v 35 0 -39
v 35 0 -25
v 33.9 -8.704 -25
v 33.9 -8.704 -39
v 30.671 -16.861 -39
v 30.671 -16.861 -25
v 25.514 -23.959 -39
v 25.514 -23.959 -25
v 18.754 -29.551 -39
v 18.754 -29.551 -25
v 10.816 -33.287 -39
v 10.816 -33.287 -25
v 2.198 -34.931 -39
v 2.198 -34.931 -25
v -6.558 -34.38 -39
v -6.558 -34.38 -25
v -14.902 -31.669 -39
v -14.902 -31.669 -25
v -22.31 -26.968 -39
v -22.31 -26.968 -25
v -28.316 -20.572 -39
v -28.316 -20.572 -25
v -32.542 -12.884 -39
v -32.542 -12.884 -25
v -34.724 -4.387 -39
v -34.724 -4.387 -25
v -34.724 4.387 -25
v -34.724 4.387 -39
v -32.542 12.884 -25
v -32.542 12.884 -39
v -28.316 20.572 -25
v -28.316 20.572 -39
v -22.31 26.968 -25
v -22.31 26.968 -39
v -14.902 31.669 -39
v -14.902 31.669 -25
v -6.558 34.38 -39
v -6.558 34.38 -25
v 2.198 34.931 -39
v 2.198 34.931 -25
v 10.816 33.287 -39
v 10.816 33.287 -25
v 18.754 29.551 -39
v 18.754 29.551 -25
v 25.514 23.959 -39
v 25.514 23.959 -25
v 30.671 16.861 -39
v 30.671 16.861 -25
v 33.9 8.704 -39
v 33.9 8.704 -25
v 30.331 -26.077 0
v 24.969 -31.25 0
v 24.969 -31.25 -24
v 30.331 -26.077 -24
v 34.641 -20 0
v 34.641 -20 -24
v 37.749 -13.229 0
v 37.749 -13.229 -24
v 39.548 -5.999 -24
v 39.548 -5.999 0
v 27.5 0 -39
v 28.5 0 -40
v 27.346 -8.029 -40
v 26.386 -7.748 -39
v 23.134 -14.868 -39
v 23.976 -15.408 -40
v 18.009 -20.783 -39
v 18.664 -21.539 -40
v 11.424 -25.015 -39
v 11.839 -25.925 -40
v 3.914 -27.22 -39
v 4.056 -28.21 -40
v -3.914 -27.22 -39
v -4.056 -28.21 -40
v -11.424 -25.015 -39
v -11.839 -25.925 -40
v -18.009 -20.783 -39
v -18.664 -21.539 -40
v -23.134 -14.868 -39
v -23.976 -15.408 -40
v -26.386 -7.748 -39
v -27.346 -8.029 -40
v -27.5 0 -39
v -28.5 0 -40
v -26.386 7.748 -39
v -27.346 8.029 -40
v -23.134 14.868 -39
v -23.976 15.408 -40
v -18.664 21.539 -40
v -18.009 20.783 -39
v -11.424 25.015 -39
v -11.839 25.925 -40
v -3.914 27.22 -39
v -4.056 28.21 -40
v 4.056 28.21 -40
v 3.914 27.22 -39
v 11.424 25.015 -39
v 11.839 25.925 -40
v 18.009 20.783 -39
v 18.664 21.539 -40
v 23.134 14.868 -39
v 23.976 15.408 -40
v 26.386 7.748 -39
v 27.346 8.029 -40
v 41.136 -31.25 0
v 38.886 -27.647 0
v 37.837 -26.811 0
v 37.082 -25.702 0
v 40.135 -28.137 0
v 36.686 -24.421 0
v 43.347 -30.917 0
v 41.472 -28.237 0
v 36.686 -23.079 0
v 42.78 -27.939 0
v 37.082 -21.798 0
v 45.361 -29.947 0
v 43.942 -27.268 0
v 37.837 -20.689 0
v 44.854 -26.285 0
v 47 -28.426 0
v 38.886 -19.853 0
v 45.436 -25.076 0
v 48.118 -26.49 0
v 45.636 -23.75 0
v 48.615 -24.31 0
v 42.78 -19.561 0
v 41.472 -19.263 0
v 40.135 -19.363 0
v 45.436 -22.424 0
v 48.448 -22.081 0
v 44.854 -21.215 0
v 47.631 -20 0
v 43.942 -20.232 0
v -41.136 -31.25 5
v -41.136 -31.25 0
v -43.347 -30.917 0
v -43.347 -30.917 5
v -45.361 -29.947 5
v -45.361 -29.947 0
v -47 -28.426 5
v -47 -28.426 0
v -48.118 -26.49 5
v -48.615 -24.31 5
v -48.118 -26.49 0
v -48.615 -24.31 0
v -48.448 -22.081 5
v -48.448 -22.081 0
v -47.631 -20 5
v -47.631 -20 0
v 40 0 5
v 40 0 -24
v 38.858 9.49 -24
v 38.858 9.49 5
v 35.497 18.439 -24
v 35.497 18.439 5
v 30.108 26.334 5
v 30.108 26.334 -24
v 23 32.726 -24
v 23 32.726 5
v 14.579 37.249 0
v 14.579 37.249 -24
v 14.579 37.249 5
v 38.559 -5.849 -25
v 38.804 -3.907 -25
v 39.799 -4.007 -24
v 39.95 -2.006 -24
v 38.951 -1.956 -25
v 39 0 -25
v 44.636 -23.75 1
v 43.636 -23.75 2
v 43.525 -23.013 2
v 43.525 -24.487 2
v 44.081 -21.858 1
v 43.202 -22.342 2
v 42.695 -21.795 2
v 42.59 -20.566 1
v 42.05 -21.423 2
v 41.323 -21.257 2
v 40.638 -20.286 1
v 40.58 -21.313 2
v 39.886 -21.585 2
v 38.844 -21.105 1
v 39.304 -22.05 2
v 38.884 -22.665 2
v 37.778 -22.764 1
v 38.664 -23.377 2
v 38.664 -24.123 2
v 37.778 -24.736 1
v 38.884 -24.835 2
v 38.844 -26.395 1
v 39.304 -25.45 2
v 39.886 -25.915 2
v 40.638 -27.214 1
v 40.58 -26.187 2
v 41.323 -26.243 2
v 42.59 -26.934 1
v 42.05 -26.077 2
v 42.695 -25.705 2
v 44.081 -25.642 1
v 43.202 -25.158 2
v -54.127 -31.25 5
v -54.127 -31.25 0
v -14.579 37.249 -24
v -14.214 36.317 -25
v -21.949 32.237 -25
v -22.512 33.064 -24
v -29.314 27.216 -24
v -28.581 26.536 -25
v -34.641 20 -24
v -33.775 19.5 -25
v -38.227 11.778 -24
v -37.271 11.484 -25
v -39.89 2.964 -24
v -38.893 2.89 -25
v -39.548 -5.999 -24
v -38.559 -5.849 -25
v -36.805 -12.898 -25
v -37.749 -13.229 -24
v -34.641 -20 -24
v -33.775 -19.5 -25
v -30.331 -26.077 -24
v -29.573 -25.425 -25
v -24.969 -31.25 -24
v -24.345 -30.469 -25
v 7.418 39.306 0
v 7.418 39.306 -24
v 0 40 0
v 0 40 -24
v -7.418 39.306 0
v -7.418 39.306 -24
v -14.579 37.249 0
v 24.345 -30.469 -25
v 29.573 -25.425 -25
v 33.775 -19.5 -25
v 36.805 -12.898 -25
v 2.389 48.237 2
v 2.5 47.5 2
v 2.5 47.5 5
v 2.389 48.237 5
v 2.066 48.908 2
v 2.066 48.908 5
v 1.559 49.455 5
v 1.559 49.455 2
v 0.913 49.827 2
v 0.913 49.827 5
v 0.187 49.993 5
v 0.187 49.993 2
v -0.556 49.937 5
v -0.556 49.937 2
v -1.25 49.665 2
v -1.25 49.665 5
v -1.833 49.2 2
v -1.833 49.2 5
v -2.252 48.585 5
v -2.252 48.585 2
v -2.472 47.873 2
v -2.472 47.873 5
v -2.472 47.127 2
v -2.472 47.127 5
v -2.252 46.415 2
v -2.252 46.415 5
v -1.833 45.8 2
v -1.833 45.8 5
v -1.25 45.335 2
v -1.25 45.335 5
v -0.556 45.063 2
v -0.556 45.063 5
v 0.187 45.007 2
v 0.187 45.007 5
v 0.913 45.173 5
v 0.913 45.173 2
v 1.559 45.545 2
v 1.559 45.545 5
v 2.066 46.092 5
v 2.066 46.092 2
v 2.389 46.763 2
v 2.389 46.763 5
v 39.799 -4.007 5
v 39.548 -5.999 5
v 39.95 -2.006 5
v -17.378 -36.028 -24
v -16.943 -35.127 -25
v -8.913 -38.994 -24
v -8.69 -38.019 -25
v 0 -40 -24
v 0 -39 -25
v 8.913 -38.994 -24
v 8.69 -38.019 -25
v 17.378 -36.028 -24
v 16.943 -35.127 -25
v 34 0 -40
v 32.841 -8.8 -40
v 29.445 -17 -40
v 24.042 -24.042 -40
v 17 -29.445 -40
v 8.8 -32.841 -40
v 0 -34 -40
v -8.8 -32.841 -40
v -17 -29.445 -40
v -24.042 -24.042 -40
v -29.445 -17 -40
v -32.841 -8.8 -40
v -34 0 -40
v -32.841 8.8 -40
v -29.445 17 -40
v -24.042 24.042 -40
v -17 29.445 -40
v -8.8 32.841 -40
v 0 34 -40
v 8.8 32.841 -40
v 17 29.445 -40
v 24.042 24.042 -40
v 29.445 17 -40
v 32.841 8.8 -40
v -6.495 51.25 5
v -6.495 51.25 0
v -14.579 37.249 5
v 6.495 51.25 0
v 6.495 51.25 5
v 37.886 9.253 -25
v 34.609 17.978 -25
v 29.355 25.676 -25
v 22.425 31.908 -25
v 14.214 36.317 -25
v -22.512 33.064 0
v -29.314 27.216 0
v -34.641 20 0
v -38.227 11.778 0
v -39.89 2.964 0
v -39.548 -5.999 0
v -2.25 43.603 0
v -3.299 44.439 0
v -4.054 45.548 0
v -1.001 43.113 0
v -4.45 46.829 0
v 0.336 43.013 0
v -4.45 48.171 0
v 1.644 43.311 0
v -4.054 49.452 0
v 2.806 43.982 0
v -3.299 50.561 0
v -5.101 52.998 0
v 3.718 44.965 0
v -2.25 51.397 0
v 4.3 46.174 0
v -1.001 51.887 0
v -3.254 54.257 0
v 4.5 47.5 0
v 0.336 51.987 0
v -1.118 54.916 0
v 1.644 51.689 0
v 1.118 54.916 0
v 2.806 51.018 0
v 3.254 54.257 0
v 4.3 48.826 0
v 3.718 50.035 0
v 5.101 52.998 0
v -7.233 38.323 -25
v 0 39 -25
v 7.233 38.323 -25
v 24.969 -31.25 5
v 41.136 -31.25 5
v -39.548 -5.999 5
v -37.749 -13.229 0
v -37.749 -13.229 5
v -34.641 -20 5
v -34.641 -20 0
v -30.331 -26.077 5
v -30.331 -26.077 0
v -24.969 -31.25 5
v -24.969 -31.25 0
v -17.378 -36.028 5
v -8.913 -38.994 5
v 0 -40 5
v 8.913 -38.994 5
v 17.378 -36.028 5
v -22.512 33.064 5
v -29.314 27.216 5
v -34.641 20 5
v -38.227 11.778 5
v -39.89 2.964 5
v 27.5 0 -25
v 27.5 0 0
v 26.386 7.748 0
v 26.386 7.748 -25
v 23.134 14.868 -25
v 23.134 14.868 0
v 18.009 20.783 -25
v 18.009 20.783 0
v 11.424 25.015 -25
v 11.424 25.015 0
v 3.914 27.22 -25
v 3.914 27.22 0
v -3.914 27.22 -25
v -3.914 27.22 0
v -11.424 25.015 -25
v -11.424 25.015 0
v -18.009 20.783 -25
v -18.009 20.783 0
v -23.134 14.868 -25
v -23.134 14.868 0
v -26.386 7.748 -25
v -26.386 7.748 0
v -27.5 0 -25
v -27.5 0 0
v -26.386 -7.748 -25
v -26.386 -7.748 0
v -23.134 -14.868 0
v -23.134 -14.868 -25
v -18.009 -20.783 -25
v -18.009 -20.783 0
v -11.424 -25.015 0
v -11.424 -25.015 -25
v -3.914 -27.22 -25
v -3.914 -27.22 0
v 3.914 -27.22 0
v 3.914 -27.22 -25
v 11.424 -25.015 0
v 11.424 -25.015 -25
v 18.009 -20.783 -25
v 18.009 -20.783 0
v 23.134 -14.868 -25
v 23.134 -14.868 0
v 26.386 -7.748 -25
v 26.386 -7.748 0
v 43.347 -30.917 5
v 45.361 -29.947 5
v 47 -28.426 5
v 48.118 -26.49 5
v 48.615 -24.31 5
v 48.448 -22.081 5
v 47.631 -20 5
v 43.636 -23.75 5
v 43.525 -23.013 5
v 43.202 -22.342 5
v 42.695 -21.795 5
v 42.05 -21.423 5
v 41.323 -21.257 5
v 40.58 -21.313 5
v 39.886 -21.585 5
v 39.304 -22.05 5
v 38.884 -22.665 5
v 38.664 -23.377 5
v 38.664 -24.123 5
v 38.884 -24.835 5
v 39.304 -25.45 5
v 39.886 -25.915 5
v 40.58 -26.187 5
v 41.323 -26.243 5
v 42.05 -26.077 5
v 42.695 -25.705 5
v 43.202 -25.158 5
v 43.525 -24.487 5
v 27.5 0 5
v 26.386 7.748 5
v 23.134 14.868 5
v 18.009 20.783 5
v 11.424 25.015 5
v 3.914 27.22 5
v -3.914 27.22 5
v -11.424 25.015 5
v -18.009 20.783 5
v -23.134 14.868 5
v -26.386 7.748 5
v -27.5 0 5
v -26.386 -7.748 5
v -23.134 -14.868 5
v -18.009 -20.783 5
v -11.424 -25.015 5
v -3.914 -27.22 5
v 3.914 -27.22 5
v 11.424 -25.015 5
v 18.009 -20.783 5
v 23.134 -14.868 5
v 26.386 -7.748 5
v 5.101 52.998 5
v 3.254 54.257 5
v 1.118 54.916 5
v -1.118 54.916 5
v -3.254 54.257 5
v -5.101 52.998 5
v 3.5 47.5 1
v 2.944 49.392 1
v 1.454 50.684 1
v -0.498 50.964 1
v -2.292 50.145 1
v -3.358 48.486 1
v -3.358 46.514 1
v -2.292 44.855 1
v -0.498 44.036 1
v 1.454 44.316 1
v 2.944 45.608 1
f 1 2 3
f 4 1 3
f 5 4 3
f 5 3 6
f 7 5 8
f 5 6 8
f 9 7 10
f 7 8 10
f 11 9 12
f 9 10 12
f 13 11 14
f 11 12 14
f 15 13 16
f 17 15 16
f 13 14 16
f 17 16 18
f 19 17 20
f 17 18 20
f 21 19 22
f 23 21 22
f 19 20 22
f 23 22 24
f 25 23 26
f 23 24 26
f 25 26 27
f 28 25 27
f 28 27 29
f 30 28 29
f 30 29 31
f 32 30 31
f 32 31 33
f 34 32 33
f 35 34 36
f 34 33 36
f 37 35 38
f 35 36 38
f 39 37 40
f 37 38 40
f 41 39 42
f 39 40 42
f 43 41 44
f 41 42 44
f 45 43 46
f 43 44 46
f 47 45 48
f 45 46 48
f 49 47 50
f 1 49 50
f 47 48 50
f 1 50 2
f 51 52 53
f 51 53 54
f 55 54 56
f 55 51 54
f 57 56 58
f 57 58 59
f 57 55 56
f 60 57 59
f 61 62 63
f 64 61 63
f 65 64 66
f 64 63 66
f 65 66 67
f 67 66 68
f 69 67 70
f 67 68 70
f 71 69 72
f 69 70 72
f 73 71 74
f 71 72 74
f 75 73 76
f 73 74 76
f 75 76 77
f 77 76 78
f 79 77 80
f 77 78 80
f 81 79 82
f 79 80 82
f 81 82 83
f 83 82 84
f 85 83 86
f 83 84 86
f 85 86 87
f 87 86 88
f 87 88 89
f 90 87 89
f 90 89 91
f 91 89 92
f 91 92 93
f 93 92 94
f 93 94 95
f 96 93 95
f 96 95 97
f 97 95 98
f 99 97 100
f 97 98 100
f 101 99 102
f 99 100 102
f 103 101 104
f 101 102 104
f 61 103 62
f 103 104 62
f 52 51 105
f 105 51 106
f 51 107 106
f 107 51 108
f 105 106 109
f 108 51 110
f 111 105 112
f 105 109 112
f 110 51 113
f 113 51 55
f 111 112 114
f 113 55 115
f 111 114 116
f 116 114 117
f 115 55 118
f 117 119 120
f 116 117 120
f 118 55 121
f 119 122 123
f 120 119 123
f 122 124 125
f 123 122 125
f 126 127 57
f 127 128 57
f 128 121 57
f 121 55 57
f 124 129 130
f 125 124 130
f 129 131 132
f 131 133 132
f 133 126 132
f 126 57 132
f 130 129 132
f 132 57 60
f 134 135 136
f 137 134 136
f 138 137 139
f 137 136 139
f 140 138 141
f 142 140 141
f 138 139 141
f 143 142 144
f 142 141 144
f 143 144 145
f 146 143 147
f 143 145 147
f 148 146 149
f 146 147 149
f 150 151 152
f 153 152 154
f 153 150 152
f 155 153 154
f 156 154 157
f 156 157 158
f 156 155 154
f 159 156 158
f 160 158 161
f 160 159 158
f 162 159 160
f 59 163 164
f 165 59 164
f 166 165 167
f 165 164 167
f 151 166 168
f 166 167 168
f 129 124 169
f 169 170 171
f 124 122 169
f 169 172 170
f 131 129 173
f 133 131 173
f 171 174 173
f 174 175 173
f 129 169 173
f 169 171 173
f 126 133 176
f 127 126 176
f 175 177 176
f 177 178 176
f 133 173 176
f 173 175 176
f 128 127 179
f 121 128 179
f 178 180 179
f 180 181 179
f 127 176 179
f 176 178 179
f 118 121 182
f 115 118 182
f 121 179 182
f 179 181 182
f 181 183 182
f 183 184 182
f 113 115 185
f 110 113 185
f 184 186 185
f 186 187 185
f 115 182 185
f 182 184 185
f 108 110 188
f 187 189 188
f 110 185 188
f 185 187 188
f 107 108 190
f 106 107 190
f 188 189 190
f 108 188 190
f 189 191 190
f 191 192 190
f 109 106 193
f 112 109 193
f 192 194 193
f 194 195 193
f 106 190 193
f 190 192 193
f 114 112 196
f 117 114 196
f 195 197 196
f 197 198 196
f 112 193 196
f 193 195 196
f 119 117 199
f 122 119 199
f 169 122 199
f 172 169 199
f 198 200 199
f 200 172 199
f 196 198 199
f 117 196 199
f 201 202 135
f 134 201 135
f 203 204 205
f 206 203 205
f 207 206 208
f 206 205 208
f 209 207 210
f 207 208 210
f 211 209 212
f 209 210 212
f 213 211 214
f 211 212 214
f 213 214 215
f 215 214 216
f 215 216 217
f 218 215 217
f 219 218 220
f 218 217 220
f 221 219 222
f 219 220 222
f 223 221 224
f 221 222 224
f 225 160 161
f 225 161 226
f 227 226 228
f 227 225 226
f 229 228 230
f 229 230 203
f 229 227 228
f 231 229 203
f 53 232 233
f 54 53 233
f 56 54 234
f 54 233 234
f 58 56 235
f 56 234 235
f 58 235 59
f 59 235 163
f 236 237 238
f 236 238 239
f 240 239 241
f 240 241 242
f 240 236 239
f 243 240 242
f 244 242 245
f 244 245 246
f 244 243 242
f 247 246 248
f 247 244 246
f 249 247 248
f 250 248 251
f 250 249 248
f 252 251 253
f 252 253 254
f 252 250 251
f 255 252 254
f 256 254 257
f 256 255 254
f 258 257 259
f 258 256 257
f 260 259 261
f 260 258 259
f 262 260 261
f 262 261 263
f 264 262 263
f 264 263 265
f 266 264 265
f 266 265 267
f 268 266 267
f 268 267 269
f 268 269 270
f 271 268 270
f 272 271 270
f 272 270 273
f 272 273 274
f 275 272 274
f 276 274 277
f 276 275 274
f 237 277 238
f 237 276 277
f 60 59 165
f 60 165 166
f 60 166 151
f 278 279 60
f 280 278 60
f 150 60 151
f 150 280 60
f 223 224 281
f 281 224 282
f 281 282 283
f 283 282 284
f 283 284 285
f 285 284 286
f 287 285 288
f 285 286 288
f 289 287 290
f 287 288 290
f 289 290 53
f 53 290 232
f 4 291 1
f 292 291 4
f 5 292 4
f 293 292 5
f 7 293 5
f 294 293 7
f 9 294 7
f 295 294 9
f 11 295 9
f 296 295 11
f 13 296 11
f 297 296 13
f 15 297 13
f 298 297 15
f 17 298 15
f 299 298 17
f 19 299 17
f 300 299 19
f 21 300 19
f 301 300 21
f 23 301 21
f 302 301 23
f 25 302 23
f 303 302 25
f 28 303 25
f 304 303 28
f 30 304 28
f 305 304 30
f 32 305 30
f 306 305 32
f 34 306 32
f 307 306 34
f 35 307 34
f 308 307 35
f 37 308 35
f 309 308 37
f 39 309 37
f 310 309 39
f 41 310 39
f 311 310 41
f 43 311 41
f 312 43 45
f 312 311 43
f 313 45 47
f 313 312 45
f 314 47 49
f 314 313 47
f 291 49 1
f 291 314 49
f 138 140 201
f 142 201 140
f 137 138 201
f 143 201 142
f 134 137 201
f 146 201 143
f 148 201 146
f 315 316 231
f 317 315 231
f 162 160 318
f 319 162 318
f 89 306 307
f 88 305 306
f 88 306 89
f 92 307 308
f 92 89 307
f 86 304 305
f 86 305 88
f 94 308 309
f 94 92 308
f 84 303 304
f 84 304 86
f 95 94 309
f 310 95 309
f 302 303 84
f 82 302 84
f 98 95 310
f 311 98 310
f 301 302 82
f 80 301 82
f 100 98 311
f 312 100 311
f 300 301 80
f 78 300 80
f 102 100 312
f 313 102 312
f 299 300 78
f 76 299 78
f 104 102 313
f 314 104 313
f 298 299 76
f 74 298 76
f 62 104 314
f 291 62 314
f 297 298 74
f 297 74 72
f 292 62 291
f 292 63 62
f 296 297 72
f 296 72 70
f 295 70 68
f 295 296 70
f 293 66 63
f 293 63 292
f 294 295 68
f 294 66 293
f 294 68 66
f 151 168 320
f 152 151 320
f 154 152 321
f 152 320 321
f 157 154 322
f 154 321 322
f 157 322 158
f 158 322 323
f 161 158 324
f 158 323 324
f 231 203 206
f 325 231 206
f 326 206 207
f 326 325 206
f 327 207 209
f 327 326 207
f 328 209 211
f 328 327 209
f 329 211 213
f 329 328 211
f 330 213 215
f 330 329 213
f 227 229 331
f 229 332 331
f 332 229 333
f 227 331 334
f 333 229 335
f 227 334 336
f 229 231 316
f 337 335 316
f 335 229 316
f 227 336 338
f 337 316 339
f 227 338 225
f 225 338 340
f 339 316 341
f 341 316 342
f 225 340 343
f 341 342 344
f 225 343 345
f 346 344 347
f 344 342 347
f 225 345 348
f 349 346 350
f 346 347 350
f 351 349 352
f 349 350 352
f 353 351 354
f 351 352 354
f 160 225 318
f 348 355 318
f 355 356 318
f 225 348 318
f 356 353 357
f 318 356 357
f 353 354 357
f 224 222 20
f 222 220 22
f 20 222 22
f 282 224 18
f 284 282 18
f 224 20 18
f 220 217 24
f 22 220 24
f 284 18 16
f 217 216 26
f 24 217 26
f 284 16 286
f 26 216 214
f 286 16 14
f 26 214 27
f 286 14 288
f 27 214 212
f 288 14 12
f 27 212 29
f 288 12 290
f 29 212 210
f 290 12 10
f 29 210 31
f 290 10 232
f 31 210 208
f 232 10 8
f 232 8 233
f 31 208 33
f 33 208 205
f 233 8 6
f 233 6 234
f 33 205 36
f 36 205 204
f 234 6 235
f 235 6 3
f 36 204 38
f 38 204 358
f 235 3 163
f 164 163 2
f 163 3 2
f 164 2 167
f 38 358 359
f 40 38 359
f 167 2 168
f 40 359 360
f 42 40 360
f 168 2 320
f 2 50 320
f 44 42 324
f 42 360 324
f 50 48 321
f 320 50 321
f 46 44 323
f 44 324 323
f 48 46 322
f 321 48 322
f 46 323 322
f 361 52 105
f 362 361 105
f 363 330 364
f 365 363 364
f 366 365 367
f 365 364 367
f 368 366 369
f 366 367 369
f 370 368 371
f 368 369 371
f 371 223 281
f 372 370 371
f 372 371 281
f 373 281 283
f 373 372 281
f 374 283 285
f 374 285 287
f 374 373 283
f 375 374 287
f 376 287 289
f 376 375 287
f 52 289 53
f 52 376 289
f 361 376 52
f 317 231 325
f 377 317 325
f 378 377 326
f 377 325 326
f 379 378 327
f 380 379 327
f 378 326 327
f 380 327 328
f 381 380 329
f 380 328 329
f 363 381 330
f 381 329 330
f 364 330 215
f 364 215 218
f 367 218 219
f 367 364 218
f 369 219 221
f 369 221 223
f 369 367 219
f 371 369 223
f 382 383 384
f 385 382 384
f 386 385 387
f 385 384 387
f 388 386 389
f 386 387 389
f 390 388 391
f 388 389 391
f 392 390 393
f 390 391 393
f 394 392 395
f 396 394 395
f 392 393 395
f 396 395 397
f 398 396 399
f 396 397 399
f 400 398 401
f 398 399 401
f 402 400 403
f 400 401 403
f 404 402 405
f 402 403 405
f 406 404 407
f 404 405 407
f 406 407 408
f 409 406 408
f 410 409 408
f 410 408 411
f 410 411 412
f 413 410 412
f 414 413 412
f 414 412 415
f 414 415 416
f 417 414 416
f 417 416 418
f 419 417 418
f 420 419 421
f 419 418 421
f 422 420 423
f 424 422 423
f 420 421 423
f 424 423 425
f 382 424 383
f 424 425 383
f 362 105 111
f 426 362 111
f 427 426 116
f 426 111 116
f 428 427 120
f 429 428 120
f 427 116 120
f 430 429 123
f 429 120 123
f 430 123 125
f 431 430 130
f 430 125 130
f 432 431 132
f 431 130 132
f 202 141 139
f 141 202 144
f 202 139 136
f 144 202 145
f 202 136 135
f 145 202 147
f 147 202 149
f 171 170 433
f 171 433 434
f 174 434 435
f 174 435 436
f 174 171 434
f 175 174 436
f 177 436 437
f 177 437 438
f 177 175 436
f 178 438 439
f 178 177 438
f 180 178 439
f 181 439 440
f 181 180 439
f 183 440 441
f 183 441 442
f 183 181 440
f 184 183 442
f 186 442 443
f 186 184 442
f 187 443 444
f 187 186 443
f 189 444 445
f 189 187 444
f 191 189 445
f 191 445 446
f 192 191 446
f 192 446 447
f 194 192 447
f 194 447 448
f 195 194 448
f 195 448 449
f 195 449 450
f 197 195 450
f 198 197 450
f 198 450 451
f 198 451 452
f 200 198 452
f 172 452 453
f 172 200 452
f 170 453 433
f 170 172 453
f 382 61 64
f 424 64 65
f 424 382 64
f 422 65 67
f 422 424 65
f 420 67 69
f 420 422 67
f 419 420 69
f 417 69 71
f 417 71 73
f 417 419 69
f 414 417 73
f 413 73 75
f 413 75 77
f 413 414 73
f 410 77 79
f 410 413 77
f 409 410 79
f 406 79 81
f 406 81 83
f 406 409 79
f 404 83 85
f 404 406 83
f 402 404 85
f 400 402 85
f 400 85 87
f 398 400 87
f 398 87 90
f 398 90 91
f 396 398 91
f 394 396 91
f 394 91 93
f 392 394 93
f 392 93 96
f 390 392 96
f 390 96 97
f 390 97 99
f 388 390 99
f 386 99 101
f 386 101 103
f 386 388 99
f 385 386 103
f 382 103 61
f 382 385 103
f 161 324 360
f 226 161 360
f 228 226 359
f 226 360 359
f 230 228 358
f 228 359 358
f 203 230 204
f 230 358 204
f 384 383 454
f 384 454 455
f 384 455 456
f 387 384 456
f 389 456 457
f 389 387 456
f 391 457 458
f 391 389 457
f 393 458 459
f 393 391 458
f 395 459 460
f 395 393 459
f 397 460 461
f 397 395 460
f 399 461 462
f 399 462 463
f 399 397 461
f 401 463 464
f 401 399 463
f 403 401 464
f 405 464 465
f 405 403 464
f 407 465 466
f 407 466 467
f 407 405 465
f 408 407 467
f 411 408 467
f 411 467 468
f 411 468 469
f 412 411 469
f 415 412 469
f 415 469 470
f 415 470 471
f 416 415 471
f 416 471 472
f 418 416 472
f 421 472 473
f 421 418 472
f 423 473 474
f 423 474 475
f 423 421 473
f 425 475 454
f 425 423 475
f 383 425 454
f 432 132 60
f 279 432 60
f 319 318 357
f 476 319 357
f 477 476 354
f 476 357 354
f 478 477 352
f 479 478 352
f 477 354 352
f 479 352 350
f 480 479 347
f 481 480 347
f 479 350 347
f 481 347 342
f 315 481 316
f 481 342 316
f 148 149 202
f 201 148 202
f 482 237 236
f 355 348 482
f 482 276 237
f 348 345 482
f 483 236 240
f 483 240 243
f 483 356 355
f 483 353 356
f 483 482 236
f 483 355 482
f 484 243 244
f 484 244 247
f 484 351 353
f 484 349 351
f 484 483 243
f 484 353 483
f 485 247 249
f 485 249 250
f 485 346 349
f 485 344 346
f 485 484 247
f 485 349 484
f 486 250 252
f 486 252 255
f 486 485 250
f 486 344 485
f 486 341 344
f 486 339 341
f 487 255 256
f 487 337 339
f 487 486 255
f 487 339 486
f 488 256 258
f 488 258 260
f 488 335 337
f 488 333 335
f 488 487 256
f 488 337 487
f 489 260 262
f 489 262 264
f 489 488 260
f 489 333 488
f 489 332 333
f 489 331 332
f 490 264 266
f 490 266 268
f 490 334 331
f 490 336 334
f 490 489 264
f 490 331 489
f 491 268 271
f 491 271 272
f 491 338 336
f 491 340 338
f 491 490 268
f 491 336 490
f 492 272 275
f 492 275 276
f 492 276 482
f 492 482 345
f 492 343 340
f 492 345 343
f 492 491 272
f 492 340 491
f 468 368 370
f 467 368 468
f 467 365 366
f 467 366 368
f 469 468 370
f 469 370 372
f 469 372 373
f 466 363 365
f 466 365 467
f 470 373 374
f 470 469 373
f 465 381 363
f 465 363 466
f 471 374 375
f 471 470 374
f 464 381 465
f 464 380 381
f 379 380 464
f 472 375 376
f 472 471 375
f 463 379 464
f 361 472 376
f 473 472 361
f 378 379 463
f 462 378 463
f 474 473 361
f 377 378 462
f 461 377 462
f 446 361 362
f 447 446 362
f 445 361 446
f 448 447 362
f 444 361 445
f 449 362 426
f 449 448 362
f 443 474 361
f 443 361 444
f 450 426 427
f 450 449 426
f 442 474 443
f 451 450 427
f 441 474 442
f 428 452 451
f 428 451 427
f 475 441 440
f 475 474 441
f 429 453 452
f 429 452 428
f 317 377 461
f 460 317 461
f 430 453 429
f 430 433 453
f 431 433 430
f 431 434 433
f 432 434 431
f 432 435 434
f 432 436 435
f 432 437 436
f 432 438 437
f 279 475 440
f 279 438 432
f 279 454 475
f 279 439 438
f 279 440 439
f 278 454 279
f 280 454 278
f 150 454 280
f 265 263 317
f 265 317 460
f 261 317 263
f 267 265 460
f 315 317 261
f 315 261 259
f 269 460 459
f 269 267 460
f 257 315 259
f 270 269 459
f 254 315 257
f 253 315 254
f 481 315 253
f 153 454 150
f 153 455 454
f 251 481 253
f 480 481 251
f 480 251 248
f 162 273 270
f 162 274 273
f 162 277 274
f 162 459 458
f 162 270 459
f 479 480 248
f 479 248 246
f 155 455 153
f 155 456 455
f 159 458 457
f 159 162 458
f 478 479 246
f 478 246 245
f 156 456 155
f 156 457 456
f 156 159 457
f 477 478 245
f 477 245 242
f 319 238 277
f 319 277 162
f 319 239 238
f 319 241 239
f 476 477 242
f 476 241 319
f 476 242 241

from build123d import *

# Parameters (mm, degrees)
F0_R     = 27.5
F0_R_2   = 2.5
F1_DEPTH = 5
F2_DEPTH = 25
F3_R     = 35
F3_R_2   = 27.5
F4_DEPTH = 15
F5_SIZE  = 2
F6_SIZE  = 1


with BuildPart() as f1:
    # F0 (on Top) → F1 (new body)
    with BuildSketch(Plane.XY):
        with BuildLine():
            ThreePointArc((39.5476590904, -5.998554865), (39.8867544657, -3.0077929104), (40, 0))
            ThreePointArc((40, 0), (33.0390461866, 22.5482023026), (14.5789286461, 37.248554865))
            ThreePointArc((14.5789286461, 37.248554865), (0, 40), (-14.5789286461, 37.248554865))
            ThreePointArc((-14.5789286461, 37.248554865), (-34.6410161514, 20), (-39.5476590904, -5.998554865))
            ThreePointArc((-39.5476590904, -5.998554865), (-34.6410161514, -20), (-24.9687304443, -31.25))
            ThreePointArc((-24.9687304443, -31.25), (0, -40), (24.9687304443, -31.25))
            ThreePointArc((24.9687304443, -31.25), (34.6410161514, -20), (39.5476590904, -5.998554865))
        make_face()
        Circle(F0_R, mode=Mode.SUBTRACT)
        with BuildLine():
            ThreePointArc((-14.5789286461, 37.248554865), (0, 40), (14.5789286461, 37.248554865))
            Line((14.5789286461, 37.248554865), (6.4951905284, 51.25))
            ThreePointArc((6.4951905284, 51.25), (0, 55), (-6.4951905284, 51.25))
            Line((-6.4951905284, 51.25), (-14.5789286461, 37.248554865))
        make_face()
        with Locations((0, 47.5)):
            Circle(F0_R_2, mode=Mode.SUBTRACT)
        with BuildLine():
            Line((47.6313972081, -20), (39.5476590904, -5.998554865))
            ThreePointArc((39.5476590904, -5.998554865), (34.6410161514, -20), (24.9687304443, -31.25))
            Line((24.9687304443, -31.25), (41.1362066798, -31.25))
            ThreePointArc((41.1362066798, -31.25), (47.6313972081, -27.5), (47.6313972081, -20))
        make_face()
        with Locations((41.1362066798, -23.75)):
            Circle(F0_R_2, mode=Mode.SUBTRACT)
    extrude(amount=F1_DEPTH)

    # F0 (on Top) → F2 (join)
    with BuildSketch(Plane.XY):
        with BuildLine():
            ThreePointArc((39.5476590904, -5.998554865), (39.8867544657, -3.0077929104), (40, 0))
            ThreePointArc((40, 0), (33.0390461866, 22.5482023026), (14.5789286461, 37.248554865))
            ThreePointArc((14.5789286461, 37.248554865), (0, 40), (-14.5789286461, 37.248554865))
            ThreePointArc((-14.5789286461, 37.248554865), (-34.6410161514, 20), (-39.5476590904, -5.998554865))
            ThreePointArc((-39.5476590904, -5.998554865), (-34.6410161514, -20), (-24.9687304443, -31.25))
            ThreePointArc((-24.9687304443, -31.25), (0, -40), (24.9687304443, -31.25))
            ThreePointArc((24.9687304443, -31.25), (34.6410161514, -20), (39.5476590904, -5.998554865))
        make_face()
        Circle(F0_R, mode=Mode.SUBTRACT)
    extrude(amount=-F2_DEPTH)

    # F3 (on face) → F4 (join)
    with BuildSketch(Plane(origin=(0, 0, -25), x_dir=(1, 0, 0), z_dir=(0, 0, -1))):
        Circle(F3_R)
        Circle(F3_R_2, mode=Mode.SUBTRACT)
    extrude(amount=F4_DEPTH)

    # F5
    f5_edges = [f1.edges().sort_by_distance(p)[0] for p in [
        (-2.5, 47.5, 0),
        (38.636207, -23.75, 0),
    ]]
    chamfer(f5_edges, length=F5_SIZE)

    # F6
    f6_edges = [f1.edges().sort_by_distance(p)[0] for p in [
        (39.547659, 5.998555, -25),
        (-35, 0, -40),
        (-27.5, 0, -40),
    ]]
    chamfer(f6_edges, length=F6_SIZE)


with BuildPart() as f1b:
    # F0 (on Top) → F1, piece 2 (new body)
    with BuildSketch(Plane.XY):
        with BuildLine():
            ThreePointArc((-41.1362066798, -31.25), (-47.6313972081, -27.5), (-47.6313972081, -20))
            Line((-47.6313972081, -20), (-54.1265877365, -31.25))
            Line((-54.1265877365, -31.25), (-41.1362066798, -31.25))
        make_face()
    extrude(amount=F1_DEPTH)


solid = Compound([f1.part, f1b.part])
